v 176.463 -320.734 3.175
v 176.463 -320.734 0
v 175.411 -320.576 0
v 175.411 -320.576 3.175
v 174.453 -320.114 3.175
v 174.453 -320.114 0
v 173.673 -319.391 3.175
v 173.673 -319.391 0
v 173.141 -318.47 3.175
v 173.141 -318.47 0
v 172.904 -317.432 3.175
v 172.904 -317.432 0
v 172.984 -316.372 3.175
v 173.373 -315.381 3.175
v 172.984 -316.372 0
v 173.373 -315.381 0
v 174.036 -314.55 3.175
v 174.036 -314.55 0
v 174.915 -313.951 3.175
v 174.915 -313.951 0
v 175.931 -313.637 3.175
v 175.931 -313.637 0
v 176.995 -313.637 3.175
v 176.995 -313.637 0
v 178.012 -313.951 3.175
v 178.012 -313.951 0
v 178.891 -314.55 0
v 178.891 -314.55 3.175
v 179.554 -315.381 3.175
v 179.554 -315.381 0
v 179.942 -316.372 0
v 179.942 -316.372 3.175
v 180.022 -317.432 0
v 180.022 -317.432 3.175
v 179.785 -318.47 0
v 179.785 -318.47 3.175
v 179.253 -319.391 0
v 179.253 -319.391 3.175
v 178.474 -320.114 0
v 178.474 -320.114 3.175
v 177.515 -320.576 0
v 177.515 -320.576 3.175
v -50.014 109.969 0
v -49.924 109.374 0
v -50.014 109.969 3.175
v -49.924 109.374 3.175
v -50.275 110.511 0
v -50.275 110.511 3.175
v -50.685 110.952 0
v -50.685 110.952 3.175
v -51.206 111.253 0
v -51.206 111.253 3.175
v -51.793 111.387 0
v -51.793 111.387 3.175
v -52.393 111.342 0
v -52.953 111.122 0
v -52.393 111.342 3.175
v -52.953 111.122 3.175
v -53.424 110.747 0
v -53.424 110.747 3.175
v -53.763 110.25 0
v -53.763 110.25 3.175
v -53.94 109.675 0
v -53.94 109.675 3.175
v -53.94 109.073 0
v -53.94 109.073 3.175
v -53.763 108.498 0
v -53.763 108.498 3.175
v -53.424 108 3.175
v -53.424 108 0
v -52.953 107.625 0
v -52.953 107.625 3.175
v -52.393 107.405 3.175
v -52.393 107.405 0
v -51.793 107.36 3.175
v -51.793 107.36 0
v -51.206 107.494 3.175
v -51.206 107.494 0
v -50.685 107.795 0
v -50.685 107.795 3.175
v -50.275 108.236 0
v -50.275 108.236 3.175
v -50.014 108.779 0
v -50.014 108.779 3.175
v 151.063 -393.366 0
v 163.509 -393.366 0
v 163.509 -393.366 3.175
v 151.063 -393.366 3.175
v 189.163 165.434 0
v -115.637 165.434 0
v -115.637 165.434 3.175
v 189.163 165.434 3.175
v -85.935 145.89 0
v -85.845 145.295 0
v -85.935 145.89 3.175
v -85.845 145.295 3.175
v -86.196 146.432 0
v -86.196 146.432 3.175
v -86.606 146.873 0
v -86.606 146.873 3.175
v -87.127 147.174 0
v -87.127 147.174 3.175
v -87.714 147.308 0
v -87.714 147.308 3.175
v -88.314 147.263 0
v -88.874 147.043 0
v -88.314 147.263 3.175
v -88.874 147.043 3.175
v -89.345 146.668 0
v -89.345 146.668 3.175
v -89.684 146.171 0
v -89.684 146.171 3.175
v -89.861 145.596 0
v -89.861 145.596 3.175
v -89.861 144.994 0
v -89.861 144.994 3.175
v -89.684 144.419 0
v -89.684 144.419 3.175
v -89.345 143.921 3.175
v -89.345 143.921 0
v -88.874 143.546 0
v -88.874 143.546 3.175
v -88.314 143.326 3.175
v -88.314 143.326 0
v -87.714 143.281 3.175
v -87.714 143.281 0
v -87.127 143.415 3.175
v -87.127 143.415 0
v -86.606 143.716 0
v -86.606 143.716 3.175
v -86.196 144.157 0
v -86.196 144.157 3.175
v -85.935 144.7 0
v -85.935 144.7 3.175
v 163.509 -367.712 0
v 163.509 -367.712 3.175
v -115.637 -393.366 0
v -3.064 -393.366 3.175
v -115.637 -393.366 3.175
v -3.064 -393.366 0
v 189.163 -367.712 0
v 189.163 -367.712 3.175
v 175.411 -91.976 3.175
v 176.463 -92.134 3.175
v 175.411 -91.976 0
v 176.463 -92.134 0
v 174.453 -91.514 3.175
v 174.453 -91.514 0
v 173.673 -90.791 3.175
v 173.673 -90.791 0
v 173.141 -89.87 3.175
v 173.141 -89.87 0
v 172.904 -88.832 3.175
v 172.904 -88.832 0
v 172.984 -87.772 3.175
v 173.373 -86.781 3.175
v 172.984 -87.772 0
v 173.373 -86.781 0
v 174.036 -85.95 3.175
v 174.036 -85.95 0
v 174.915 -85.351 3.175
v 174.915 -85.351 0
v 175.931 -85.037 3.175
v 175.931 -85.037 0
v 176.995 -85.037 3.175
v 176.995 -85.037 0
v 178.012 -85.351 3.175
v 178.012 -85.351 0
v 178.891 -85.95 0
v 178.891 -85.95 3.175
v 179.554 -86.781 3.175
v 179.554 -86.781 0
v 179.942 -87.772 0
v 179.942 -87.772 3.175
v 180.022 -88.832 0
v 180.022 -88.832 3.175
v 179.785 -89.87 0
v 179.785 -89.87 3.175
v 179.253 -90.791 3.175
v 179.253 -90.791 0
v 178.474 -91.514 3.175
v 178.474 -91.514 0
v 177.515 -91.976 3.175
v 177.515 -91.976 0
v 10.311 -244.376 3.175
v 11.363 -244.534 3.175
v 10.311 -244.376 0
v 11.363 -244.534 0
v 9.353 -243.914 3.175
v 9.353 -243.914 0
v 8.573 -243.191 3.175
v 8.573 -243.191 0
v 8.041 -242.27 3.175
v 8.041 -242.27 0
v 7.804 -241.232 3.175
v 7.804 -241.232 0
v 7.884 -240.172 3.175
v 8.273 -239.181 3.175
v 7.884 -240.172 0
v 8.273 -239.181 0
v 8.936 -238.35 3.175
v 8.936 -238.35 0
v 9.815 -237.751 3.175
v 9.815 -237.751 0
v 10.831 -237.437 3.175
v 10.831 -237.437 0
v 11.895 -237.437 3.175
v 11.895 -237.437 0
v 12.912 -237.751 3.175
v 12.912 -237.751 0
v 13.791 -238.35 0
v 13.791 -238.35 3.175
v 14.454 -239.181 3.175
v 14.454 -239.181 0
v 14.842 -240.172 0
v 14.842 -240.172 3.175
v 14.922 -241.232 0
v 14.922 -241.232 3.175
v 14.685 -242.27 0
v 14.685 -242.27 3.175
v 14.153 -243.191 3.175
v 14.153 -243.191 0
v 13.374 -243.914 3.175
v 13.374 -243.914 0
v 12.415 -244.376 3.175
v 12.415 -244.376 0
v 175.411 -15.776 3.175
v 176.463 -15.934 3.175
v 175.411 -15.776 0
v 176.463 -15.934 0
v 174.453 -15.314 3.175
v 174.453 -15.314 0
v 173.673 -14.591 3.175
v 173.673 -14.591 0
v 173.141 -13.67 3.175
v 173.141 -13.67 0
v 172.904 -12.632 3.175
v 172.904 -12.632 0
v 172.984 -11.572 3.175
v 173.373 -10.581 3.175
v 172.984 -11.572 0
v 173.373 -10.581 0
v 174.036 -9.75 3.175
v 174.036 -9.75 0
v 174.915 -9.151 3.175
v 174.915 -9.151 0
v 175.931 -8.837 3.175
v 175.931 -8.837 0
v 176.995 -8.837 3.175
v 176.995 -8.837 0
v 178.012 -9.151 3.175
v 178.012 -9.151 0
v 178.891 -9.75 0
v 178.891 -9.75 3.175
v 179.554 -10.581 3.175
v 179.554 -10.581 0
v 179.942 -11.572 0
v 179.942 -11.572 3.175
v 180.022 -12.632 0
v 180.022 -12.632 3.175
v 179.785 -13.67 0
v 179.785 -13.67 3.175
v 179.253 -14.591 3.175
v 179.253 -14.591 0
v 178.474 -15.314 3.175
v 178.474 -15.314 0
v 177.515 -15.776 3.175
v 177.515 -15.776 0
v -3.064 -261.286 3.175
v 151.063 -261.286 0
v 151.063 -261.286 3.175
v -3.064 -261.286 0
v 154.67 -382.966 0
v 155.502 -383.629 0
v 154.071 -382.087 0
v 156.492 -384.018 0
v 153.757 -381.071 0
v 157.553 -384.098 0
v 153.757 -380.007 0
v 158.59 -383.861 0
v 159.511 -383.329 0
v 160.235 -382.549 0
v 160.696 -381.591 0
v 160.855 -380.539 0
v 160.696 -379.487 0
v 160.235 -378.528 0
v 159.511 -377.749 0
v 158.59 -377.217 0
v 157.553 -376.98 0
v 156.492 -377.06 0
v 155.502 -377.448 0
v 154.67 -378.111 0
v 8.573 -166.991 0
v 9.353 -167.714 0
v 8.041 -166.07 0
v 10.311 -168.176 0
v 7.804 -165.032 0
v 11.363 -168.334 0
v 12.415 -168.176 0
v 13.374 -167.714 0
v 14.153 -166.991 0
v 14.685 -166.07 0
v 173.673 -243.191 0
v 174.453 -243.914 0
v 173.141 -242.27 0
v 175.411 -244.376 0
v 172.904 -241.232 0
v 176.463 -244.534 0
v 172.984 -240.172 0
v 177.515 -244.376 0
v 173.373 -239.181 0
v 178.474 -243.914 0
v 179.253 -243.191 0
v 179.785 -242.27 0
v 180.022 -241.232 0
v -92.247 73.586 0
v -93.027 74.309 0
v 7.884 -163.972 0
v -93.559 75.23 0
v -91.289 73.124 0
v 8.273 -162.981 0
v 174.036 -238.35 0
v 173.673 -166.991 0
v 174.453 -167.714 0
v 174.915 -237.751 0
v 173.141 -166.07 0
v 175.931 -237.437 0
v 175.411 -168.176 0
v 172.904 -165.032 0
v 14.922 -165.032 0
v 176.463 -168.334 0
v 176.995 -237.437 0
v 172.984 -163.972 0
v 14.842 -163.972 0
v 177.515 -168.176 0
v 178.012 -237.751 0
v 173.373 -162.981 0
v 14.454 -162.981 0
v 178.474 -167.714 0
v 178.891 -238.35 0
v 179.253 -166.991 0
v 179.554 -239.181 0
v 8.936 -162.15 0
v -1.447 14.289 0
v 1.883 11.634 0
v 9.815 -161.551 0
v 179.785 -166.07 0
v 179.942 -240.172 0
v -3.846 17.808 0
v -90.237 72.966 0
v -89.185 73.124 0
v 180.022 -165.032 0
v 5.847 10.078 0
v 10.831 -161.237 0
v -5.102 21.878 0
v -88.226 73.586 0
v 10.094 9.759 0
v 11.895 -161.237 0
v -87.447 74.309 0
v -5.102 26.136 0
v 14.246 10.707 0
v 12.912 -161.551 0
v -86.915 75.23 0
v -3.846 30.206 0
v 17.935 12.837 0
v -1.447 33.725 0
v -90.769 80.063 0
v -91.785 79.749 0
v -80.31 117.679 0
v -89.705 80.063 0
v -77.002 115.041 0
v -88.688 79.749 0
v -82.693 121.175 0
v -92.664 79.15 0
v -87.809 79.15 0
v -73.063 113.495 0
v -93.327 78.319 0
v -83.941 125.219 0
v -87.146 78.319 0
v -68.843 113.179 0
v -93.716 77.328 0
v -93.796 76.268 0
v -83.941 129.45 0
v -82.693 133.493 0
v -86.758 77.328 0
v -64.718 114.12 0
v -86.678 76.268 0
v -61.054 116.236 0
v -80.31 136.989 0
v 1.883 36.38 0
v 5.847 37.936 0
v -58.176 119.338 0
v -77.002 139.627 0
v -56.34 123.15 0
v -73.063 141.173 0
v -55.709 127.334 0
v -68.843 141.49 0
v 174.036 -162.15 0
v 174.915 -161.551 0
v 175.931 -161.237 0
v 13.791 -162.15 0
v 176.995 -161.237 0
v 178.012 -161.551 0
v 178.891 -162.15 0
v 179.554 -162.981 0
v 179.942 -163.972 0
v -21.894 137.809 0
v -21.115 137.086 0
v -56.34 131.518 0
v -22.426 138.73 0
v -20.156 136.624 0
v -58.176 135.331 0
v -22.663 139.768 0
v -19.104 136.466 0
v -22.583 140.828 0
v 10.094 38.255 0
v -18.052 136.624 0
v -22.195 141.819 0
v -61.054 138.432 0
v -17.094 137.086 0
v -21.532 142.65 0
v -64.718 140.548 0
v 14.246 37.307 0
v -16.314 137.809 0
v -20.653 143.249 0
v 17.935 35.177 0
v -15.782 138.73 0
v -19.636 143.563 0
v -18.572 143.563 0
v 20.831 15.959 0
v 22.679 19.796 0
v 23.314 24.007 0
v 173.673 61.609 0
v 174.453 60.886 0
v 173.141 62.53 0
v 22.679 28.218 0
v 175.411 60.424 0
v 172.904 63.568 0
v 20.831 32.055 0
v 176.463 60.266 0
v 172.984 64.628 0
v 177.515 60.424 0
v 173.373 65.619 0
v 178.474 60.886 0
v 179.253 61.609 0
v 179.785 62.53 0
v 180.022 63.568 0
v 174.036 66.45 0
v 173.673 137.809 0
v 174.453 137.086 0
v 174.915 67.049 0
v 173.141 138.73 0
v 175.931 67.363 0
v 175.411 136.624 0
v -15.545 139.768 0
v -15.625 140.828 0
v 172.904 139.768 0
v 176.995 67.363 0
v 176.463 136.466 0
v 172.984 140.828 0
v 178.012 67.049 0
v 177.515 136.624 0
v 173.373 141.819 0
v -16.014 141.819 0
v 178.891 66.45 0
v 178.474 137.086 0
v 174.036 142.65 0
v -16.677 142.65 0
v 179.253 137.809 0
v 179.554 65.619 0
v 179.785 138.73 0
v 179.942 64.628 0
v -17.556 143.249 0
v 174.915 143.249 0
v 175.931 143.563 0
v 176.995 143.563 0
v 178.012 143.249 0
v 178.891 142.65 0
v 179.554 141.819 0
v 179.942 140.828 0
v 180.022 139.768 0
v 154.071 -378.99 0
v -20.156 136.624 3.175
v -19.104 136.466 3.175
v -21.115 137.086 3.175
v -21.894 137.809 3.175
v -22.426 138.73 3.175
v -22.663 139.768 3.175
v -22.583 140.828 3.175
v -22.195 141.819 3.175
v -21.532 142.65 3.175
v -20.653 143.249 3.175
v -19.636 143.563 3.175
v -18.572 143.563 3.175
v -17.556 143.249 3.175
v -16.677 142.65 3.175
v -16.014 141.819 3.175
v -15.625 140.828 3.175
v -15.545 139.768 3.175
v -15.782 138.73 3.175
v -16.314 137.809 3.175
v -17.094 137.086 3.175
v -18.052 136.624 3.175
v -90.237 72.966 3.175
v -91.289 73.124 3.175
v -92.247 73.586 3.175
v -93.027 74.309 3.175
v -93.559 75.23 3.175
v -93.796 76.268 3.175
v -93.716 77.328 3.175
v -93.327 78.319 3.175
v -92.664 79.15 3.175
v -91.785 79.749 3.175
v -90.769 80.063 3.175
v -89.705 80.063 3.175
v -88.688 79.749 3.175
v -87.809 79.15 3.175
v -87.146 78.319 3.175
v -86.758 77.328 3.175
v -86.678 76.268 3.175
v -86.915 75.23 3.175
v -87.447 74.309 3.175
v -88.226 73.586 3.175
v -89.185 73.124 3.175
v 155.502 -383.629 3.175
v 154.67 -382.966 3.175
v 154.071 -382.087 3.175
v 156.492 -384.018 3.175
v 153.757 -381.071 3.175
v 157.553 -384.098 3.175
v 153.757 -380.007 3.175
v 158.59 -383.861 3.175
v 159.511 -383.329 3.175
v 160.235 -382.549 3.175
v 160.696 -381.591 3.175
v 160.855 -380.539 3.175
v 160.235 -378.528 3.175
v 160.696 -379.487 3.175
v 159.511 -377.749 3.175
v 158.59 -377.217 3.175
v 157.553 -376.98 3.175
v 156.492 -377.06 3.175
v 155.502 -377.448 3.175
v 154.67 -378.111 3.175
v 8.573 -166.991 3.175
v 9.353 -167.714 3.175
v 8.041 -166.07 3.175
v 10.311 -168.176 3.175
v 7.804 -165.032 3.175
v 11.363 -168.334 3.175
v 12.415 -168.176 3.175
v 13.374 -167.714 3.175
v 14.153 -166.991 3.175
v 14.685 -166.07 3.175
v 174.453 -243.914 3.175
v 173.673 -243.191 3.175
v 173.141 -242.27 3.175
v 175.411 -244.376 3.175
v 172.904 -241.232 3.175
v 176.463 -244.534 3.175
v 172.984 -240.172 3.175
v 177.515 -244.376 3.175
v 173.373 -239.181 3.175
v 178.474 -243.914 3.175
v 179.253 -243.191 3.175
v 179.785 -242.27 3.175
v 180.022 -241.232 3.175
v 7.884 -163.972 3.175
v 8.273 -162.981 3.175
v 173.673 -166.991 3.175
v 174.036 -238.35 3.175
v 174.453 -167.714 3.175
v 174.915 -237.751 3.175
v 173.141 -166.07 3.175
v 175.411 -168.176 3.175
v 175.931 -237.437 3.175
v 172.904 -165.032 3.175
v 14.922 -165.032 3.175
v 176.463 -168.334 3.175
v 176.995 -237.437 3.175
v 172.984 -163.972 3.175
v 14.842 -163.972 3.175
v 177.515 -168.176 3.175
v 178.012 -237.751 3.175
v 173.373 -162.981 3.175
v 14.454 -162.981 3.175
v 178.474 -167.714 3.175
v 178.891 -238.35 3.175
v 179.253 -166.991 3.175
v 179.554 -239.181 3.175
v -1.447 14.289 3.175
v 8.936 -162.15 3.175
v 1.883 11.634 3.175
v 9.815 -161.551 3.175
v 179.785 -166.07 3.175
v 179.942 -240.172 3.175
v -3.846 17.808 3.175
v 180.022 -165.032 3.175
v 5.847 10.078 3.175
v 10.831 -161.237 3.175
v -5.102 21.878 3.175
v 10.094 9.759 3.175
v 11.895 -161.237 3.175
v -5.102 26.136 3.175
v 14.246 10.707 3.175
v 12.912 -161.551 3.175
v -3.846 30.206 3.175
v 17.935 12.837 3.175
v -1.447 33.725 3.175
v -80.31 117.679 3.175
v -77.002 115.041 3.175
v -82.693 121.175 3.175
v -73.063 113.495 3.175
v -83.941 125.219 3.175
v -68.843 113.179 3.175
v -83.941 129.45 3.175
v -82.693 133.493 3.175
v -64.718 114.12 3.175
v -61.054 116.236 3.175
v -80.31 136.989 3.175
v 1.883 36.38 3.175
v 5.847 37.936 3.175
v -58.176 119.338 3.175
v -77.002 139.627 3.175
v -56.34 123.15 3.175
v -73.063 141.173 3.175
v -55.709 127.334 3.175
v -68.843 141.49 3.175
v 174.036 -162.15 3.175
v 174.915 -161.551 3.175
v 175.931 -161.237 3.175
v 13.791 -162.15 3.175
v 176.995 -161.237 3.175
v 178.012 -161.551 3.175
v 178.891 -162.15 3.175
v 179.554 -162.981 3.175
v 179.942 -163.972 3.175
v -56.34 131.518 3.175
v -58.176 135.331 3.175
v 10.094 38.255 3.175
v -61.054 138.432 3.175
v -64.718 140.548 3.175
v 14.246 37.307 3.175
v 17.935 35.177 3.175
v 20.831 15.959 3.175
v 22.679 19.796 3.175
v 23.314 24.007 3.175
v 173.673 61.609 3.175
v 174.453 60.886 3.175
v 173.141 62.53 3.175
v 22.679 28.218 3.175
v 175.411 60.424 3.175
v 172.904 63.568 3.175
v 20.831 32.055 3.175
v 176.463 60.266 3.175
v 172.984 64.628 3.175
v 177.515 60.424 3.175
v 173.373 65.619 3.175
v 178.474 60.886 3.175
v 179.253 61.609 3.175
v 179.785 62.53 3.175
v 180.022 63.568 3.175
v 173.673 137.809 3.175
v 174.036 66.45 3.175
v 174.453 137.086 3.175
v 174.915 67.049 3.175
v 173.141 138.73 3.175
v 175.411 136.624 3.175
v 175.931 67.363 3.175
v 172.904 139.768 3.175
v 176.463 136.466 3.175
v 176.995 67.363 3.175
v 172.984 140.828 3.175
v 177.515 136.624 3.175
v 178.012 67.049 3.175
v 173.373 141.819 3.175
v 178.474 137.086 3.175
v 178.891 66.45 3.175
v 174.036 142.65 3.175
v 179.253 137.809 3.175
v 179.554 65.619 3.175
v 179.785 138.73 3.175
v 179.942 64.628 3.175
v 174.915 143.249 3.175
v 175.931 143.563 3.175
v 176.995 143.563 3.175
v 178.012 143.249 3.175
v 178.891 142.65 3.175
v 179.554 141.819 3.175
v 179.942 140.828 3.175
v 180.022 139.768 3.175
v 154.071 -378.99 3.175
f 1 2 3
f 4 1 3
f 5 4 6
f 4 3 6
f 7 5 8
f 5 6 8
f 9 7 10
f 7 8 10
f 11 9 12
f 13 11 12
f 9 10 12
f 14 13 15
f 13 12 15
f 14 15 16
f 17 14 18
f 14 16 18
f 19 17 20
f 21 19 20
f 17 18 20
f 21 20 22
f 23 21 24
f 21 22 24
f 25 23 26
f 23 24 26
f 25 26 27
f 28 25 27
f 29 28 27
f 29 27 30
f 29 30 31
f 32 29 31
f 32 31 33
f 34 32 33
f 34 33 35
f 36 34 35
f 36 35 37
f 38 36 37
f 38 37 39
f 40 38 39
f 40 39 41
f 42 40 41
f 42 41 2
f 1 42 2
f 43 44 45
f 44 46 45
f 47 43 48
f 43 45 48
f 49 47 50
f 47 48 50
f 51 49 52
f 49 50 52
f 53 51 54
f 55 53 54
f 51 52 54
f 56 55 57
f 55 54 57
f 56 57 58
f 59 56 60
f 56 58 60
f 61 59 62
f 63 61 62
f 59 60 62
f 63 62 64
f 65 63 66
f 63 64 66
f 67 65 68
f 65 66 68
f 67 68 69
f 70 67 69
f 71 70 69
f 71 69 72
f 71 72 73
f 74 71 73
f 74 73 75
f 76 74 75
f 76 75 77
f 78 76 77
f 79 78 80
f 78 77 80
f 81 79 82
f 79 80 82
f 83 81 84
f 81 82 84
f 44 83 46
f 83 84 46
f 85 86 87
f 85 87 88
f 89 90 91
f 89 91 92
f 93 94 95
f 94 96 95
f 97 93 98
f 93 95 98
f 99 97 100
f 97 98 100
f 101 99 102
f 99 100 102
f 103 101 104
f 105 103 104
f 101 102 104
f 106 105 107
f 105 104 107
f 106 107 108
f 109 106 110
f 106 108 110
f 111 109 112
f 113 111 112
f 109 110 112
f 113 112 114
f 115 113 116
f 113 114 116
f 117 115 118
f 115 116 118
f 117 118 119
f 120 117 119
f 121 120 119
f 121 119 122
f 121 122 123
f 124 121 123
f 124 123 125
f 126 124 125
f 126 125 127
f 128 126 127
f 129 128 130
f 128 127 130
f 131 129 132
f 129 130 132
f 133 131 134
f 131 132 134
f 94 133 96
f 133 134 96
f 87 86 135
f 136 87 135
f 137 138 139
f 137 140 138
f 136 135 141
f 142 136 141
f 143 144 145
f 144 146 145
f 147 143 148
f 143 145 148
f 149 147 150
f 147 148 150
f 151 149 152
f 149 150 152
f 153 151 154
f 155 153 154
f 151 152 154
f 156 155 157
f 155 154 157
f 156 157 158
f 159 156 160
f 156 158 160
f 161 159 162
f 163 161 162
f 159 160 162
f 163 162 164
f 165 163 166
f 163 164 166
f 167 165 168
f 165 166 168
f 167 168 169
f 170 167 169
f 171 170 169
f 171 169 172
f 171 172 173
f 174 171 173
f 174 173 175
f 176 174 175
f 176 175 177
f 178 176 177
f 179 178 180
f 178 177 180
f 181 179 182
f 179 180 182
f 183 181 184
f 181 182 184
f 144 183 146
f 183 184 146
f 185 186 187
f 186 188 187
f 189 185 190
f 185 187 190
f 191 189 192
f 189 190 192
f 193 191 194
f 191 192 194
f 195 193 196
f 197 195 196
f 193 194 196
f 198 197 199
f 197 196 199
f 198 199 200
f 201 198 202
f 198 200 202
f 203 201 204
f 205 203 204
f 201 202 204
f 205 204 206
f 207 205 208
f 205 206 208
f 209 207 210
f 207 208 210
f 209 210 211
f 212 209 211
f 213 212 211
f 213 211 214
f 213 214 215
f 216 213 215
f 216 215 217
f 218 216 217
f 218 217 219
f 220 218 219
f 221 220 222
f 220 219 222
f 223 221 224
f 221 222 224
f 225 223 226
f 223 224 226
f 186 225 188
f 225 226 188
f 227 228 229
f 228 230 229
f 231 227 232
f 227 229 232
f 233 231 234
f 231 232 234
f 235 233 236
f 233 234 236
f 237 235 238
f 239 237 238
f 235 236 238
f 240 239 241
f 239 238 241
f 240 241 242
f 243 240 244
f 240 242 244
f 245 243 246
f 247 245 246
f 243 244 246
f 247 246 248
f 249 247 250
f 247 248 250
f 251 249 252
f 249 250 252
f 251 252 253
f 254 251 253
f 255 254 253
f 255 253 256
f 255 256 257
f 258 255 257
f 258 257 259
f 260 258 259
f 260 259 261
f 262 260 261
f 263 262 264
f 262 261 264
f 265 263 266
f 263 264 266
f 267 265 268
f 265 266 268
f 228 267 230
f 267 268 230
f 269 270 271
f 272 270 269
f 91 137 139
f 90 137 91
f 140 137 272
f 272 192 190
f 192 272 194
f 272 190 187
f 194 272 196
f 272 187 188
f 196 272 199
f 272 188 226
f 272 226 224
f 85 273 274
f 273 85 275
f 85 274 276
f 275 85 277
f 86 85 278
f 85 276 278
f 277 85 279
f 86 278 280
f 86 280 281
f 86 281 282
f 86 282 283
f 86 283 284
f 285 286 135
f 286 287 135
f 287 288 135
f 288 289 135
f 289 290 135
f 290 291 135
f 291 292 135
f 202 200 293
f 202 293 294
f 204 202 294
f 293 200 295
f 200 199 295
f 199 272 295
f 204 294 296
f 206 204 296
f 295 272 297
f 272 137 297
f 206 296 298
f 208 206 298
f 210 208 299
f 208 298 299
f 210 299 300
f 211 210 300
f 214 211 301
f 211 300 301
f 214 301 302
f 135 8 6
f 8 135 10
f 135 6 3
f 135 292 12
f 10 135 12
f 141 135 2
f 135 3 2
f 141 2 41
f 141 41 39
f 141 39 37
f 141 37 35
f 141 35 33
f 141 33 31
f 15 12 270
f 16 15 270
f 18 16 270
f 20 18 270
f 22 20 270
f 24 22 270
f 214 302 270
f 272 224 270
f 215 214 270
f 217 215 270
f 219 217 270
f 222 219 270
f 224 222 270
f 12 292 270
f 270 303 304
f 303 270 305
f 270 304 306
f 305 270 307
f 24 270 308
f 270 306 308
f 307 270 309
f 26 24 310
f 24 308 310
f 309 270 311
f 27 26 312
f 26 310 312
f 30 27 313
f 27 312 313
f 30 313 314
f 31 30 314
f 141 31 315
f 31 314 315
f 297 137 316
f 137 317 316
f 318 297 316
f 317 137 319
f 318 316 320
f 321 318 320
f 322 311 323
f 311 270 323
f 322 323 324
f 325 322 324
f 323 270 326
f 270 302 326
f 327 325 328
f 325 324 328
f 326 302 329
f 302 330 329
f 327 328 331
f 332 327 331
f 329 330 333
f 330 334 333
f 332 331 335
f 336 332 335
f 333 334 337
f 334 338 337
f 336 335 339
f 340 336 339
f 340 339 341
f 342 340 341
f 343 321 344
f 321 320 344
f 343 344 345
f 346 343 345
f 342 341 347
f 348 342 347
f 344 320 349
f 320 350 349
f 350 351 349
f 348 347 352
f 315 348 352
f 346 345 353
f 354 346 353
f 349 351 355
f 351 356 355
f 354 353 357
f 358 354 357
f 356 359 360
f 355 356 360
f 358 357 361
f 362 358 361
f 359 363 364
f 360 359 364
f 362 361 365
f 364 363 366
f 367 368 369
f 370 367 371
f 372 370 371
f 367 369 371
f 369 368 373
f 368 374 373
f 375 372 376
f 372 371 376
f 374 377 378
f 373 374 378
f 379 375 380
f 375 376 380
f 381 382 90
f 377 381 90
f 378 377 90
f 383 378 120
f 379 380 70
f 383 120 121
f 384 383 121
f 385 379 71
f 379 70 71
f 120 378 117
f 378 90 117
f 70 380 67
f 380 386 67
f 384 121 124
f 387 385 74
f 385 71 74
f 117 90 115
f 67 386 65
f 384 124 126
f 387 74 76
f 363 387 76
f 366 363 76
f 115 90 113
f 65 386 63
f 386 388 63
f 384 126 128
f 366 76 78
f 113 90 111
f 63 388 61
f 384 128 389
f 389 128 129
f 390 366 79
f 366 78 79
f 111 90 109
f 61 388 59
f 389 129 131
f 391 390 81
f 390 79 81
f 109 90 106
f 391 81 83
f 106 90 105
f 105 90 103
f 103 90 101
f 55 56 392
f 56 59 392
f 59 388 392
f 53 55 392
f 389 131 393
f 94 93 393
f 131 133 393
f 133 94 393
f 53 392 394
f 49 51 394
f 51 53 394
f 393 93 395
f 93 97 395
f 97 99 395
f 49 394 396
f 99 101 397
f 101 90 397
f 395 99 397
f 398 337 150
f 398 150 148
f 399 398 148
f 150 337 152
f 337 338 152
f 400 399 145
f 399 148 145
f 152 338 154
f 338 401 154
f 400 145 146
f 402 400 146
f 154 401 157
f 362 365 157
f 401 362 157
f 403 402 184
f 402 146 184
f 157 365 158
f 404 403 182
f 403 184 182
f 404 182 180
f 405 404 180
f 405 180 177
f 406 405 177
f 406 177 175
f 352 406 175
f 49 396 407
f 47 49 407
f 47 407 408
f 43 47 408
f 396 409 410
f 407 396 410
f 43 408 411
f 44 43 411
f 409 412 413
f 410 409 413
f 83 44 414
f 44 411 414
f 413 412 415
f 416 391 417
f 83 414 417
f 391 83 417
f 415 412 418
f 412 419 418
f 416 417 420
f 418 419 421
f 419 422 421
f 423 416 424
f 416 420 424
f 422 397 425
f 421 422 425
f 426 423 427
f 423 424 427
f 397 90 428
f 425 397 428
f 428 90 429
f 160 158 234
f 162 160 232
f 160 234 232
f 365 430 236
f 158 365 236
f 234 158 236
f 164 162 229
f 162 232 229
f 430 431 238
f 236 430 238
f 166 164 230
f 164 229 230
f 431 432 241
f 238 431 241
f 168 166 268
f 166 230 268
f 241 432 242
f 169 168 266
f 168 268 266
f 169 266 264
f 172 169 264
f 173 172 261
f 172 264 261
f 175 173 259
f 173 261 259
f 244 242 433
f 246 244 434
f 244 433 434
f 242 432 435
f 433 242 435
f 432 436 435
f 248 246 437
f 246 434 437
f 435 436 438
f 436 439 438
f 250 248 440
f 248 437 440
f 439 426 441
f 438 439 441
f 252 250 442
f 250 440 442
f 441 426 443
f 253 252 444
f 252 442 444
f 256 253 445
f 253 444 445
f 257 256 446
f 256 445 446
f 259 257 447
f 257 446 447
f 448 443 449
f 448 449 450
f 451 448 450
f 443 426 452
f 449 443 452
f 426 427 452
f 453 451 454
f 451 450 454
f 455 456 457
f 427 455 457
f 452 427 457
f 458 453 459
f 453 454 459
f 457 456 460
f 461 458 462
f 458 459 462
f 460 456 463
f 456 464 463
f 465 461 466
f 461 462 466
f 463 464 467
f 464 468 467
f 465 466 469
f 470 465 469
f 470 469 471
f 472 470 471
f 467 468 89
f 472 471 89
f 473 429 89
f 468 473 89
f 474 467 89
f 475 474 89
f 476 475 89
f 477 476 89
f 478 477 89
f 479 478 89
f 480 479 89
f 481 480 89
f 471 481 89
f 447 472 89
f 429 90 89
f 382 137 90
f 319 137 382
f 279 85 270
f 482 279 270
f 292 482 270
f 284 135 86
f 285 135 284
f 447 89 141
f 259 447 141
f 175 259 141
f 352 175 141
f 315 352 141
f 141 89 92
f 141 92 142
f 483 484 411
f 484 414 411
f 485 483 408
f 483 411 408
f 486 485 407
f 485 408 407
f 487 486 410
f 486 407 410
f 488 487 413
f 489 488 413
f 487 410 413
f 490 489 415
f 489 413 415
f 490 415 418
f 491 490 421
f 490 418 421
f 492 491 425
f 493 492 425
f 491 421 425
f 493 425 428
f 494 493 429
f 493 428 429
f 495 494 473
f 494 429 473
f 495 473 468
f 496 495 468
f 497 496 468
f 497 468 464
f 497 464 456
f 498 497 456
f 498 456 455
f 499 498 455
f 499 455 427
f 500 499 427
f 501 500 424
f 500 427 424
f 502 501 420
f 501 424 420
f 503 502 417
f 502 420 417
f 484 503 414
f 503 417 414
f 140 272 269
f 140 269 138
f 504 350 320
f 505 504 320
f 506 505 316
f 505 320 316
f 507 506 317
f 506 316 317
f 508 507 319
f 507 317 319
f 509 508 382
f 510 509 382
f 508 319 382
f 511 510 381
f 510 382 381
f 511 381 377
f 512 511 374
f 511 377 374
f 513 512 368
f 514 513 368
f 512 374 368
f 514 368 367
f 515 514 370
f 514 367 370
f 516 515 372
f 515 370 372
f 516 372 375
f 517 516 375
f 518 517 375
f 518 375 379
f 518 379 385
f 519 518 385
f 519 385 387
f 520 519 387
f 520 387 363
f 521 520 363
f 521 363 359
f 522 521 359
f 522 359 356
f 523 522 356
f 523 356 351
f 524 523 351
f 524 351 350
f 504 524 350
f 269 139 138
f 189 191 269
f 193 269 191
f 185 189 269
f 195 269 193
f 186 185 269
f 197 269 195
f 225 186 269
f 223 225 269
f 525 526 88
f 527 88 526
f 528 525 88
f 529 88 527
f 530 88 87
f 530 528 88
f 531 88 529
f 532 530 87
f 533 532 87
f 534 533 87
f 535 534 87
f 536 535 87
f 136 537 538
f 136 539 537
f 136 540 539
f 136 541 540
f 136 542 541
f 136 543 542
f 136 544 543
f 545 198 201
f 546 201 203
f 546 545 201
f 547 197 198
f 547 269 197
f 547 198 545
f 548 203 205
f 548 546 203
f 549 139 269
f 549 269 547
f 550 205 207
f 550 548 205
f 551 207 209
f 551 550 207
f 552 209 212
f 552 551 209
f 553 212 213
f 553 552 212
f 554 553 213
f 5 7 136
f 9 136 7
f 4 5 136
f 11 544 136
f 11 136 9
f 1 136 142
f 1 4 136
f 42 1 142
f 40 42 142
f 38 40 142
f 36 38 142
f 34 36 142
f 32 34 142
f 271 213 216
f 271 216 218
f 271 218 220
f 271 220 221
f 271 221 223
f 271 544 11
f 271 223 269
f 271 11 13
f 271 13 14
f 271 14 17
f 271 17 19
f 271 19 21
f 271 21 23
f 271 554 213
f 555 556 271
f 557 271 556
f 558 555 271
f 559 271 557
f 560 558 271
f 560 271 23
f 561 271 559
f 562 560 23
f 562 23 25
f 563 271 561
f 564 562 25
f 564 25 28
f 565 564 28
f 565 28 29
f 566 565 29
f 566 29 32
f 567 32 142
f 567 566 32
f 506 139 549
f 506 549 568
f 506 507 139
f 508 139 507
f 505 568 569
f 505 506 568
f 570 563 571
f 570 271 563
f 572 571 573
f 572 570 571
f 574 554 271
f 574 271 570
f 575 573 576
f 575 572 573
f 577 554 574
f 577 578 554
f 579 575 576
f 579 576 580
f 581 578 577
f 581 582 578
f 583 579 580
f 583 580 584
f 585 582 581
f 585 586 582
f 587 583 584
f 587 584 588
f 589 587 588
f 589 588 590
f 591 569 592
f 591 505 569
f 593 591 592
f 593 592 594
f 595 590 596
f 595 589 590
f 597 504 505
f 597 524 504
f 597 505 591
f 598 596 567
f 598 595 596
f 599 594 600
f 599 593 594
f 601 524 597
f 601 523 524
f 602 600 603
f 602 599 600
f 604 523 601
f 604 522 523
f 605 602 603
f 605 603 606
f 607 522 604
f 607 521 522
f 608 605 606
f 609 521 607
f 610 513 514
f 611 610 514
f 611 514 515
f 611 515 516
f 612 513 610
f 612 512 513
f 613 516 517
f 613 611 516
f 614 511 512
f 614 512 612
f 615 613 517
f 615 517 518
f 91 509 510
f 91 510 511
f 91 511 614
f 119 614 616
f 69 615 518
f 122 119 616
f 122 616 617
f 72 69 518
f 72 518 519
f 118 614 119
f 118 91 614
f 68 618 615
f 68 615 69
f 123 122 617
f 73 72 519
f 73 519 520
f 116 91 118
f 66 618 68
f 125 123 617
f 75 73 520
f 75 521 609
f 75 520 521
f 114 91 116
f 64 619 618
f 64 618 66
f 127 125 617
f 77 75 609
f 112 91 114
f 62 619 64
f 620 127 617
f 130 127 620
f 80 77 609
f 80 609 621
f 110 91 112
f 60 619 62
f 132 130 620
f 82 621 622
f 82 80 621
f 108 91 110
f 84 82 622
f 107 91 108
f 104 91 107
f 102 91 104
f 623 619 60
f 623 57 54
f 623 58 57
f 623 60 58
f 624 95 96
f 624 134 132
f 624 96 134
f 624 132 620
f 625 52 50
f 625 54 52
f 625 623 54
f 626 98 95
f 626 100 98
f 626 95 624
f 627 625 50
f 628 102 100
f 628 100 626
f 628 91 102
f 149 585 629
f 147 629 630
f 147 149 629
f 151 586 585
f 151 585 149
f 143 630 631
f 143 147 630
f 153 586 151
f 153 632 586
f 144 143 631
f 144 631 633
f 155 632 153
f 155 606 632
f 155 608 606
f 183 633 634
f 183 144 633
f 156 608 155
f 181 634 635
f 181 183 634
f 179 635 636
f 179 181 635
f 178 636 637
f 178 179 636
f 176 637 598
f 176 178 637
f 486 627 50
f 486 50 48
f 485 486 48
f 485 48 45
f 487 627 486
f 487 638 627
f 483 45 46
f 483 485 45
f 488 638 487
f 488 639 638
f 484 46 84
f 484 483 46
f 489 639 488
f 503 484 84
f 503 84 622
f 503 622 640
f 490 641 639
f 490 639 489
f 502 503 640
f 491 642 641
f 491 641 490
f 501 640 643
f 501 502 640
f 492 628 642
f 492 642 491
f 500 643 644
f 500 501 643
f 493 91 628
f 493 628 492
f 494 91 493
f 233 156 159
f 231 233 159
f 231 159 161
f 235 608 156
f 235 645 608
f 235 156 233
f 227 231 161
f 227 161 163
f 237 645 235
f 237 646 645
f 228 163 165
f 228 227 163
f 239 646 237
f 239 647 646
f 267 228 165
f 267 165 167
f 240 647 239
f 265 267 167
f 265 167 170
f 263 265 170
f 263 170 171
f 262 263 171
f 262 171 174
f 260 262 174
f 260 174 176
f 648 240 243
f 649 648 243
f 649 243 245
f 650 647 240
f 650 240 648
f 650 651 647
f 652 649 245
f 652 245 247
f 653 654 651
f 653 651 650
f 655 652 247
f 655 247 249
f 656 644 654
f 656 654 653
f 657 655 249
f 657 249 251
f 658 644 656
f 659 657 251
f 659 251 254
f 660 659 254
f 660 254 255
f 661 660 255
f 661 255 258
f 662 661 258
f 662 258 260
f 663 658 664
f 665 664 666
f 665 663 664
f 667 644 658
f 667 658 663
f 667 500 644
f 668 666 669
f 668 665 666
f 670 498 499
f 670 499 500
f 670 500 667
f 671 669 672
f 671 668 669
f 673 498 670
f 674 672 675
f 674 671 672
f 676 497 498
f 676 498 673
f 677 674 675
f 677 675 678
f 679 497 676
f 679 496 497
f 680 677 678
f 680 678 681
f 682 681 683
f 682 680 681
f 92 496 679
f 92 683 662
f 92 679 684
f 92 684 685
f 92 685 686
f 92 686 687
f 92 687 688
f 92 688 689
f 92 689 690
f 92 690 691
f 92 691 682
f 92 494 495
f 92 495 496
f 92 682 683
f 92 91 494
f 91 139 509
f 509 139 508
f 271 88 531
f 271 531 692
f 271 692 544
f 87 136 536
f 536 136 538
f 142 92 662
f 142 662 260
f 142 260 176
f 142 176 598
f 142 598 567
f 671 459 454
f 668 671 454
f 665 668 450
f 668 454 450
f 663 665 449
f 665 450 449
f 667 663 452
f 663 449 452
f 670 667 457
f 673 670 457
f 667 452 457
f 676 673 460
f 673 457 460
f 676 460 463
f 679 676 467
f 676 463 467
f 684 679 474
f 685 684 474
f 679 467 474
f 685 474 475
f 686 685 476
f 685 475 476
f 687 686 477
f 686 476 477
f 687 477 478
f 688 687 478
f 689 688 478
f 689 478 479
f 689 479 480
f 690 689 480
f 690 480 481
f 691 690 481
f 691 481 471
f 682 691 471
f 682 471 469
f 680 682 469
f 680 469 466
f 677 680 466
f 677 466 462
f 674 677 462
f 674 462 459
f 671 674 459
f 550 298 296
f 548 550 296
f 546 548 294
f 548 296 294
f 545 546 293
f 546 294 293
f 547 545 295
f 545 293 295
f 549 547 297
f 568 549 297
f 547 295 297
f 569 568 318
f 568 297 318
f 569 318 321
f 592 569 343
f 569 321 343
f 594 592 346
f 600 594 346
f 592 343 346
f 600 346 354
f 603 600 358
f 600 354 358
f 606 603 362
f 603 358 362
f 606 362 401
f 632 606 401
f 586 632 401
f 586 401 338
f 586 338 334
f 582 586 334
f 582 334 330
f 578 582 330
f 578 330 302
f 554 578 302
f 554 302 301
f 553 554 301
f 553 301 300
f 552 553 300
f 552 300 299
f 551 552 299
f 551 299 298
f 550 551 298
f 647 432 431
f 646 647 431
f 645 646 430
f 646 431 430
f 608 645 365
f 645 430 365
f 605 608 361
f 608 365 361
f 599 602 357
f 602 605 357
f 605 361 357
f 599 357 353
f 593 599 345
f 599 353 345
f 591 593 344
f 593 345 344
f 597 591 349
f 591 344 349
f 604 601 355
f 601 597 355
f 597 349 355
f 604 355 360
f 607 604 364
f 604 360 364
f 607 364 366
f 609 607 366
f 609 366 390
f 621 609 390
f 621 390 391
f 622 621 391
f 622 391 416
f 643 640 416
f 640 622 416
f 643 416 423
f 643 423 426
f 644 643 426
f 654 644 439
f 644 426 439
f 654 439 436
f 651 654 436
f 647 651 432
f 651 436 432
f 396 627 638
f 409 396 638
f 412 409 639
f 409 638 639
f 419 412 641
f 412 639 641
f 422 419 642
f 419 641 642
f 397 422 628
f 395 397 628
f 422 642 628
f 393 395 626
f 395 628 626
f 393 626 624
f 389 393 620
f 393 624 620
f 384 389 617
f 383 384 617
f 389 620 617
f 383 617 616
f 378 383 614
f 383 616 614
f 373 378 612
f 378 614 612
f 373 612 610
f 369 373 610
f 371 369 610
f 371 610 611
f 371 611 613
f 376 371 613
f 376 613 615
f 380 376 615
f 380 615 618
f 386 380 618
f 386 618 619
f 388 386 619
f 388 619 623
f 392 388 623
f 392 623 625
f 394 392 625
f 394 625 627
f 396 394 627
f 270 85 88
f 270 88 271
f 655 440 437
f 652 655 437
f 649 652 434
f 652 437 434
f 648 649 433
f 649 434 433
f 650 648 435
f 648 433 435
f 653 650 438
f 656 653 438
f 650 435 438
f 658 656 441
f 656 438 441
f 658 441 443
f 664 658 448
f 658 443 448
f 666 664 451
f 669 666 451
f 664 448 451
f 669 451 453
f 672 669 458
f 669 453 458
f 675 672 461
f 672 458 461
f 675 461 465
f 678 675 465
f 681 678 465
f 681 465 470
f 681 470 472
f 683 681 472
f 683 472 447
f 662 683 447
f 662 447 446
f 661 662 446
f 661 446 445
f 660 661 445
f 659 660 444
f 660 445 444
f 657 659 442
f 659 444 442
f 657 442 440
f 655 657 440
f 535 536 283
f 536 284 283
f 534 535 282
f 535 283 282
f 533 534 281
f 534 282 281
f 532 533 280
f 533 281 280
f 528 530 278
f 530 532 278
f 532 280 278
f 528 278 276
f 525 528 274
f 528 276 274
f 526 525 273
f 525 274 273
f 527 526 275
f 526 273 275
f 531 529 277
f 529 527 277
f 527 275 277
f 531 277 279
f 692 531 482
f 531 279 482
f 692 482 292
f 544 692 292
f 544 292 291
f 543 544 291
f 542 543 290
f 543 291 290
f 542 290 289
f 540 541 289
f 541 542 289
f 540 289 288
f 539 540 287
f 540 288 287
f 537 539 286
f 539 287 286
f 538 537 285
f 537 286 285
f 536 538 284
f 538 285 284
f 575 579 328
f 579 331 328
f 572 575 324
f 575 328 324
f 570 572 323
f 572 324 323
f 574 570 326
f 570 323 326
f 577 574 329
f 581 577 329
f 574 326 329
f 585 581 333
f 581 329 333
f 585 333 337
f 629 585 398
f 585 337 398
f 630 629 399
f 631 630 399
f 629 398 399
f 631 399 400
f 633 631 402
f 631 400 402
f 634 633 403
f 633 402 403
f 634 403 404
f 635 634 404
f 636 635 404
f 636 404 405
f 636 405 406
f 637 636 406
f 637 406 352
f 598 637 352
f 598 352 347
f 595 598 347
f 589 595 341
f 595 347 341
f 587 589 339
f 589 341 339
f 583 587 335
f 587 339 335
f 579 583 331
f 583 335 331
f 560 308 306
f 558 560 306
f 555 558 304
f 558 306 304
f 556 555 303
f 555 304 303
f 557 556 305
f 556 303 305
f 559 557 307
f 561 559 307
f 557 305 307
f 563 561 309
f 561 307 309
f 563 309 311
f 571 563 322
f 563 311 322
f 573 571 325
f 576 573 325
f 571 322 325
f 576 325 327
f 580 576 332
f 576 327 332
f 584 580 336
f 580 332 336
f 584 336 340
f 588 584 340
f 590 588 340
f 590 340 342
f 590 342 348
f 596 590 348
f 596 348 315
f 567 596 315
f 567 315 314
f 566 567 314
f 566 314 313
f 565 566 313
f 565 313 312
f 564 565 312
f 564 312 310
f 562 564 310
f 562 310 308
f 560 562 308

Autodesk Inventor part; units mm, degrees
ref_plane "YZ Plane" through (0, 0, 0) normal (1, 0, 0) x (0, 1, 0)
ref_plane "XZ Plane" through (0, 0, 0) normal (0, 1, 0) x (-1, 0, 0)
ref_plane "XY Plane" through (0, 0, 0) normal (0, 0, 1) x (1, 0, 0)
sketch "Sketch1" plane through (0, 0, 0) normal (0, 0, 1) x (1, 0, 0)
  line L0 (-115.6368, 165.4342) -> (189.1632, 165.4342)
  line L1 (189.1632, 165.4342) -> (189.1632, -393.3658)
  line L2 (189.1632, -393.3658) -> (-115.6368, -393.3658)
  line L3 (-115.6368, -393.3658) -> (-115.6368, 165.4342)
  line L4 (151.0632, -393.3658) -> (151.0632, -261.2858)
  line L5 (189.1632, -393.3658) -> (163.5092, -393.3658)
  line L6 (163.5092, -393.3658) -> (163.5092, -367.7118)
  line L7 (163.5092, -367.7118) -> (189.1632, -367.7118)
  line L8 (189.1632, -367.7118) -> (189.1632, -393.3658)
  line L9 (151.0632, -261.2858) -> (-3.064, -261.2858)
  line L10 (-3.064, -261.2858) -> (-3.064, -393.3658)
  circle A0 centre (157.2862, -380.5388) radius 3.5687
  line L11 (189.1632, -317.1658) -> (-115.6368, -317.1658)
  circle A1 centre (9.0264, 24.007) radius 14.2875
  point P0 (0, 0)
  dimension "d0" = 304.8
  dimension "d1" = 558.8
  dimension "d2" = 180.1368
  dimension "d3" = 417.3728
  dimension "d4" = 38.1
  dimension "d5" = 25.654
  dimension "d6" = 25.654
  dimension "d7" = 154.1272
  dimension "d10" = 132.08
  dimension "d11" = 12.446
  dimension "d12" = 6.223
  dimension "d13" = 12.827
  dimension "d14" = 7.1374
  dimension "d15" = 76.2
  dimension "d16" = 28.575
extrude "Extrusion1" add sketch "Sketch1" along normal blind 3.175 contours L0 L1 L11 L4 L9 L10 L3 | L11 L10 L2 L3 | L1 L7 L6 L2 L4 L11
sketch "Sketch2" plane through (0, 0, 3.175) normal (0, 0, 1) x (1, 0, 0)
  line L0 (151.0632, -393.3658) -> (163.5092, -393.3658) projected
  line L1 (189.1632, -367.7118) -> (189.1632, 165.4342) projected
  point P0 (0, 0)
  point P1 (176.4632, -317.1658)
  point P2 (176.4632, -240.9658)
  point P3 (176.4632, -164.7658)
  point P4 (176.4632, -88.5658)
  point P5 (176.4632, -12.3658)
  point P6 (176.4632, 63.8342)
  point P7 (176.4632, 140.0342)
  point P8 (11.3632, -240.9658)
  point P9 (11.3632, -164.7658)
  dimension "d20" = 76.2
  dimension "d21" = 12.7
  dimension "d22" = 76.2
  dimension "d23" = 76.2
  dimension "d24" = 76.2
  dimension "d25" = 76.2
  dimension "d26" = 76.2
  dimension "d27" = 76.2
  dimension "d29" = 165.1
  dimension "d30" = 165.1
hole "Hole1" at (176.4632, -317.1658, 3.175) at (176.4632, -240.9658, 3.175) at (176.4632, -164.7658, 3.175) at (176.4632, -88.5658, 3.175) at (176.4632, -12.3658, 3.175) at (176.4632, 63.8342, 3.175) at (176.4632, 140.0342, 3.175) at (11.3632, -240.9658, 3.175) at (11.3632, -164.7658, 3.175) direction (0, 0, -1) diameter 7.1374 end through all
sketch "Sketch4" plane through (0, 0, 3.175) normal (0, 0, 1) x (1, 0, 0)
  circle A0 centre (-69.9042, 127.3342) radius 14.195
  circle A1 centre (-87.8647, 145.2947) radius 2.0193
  circle A2 centre (-51.9436, 109.3737) radius 2.0193
  line L0 (-90.9042, 134.5342) -> (-90.9042, 120.1342)
  line L1 (-90.9042, 120.1342) -> (-92.1292, 118.9092)
  line L2 (-92.1292, 118.9092) -> (-92.1292, 113.3342)
  line L3 (-92.1292, 113.3342) -> (-85.9042, 113.3342)
  arc A3 (-83.9042, 111.3342) -> (-85.9042, 113.3342) centre (-85.9042, 111.3342) ccw
  line L4 (-83.9042, 111.3342) -> (-83.9042, 106.3342)
  line L5 (-83.9042, 106.3342) -> (-49.9042, 106.3342)
  arc A4 (-49.9042, 106.3342) -> (-48.9042, 107.3342) centre (-69.9042, 127.3342) ccw
  line L6 (-48.9042, 107.3342) -> (-48.9042, 109.1342)
  line L7 (-48.9042, 109.1342) -> (-47.6792, 110.3592)
  line L8 (-47.6792, 110.3592) -> (-47.6792, 118.9092)
  line L9 (-47.6792, 118.9092) -> (-48.9042, 120.1342)
  line L10 (-48.9042, 120.1342) -> (-48.9042, 134.5342)
  line L11 (-48.9042, 134.5342) -> (-47.6792, 135.7592)
  line L12 (-47.6792, 135.7592) -> (-47.6792, 141.3342)
  line L13 (-47.6792, 141.3342) -> (-53.9042, 141.3342)
  arc A5 (-55.9042, 143.3342) -> (-53.9042, 141.3342) centre (-53.9042, 143.3342) ccw
  line L14 (-55.9042, 143.3342) -> (-55.9042, 148.3342)
  line L15 (-55.9042, 148.3342) -> (-89.9042, 148.3342)
  arc A6 (-89.9042, 148.3342) -> (-90.9042, 147.3342) centre (-69.9042, 127.3342) ccw
  line L16 (-90.9042, 147.3342) -> (-90.9042, 145.5342)
  line L17 (-90.9042, 145.5342) -> (-92.1292, 144.3092)
  line L18 (-92.1292, 144.3092) -> (-92.1292, 135.7592)
  line L19 (-92.1292, 135.7592) -> (-90.9042, 134.5342)
  circle A7 centre (9.0264, 24.007) radius 14.2875 projected
  line L20 (189.1632, 165.4342) -> (-115.6368, 165.4342) projected
  line L21 (-115.6368, 165.4342) -> (-115.6368, -393.3658) projected
  point P0 (0, 0)
  dimension "d50" = 3.0395
  dimension "d51" = 4.2645
  dimension "d52" = 4.2645
  dimension "d53" = 3.0395
  dimension "d54" = 130.0251
  dimension "d55" = 21
  dimension "d56" = 21
  dimension "d57" = 38.1
  dimension "d59" = 45.7327
extrude "Extrusion3" cut sketch "Sketch4" against normal blind 25.4 contours A0 | A1 | A2
sketch "Sketch5" plane through (0, 0, 3.175) normal (0, 0, 1) x (1, 0, 0)
  line L0 (-115.6368, 165.4342) -> (-115.6368, -393.3658) projected
  line L1 (189.1632, 165.4342) -> (-115.6368, 165.4342) projected
  circle A0 centre (-69.9042, 127.3342) radius 14.195 projected
  point P0 (0, 0)
  point P1 (-90.2368, 76.5342)
  point P2 (-19.1042, 140.0342)
  dimension "d62" = 25.4
  dimension "d63" = 25.4
  dimension "d64" = 50.8
  dimension "d65" = 50.8
hole "Hole2" at (-90.2368, 76.5342, 3.175) at (-19.1042, 140.0342, 3.175) direction (0, 0, -1) diameter 7.1374 end through all
properties part number "GearboxPlateRev2"
